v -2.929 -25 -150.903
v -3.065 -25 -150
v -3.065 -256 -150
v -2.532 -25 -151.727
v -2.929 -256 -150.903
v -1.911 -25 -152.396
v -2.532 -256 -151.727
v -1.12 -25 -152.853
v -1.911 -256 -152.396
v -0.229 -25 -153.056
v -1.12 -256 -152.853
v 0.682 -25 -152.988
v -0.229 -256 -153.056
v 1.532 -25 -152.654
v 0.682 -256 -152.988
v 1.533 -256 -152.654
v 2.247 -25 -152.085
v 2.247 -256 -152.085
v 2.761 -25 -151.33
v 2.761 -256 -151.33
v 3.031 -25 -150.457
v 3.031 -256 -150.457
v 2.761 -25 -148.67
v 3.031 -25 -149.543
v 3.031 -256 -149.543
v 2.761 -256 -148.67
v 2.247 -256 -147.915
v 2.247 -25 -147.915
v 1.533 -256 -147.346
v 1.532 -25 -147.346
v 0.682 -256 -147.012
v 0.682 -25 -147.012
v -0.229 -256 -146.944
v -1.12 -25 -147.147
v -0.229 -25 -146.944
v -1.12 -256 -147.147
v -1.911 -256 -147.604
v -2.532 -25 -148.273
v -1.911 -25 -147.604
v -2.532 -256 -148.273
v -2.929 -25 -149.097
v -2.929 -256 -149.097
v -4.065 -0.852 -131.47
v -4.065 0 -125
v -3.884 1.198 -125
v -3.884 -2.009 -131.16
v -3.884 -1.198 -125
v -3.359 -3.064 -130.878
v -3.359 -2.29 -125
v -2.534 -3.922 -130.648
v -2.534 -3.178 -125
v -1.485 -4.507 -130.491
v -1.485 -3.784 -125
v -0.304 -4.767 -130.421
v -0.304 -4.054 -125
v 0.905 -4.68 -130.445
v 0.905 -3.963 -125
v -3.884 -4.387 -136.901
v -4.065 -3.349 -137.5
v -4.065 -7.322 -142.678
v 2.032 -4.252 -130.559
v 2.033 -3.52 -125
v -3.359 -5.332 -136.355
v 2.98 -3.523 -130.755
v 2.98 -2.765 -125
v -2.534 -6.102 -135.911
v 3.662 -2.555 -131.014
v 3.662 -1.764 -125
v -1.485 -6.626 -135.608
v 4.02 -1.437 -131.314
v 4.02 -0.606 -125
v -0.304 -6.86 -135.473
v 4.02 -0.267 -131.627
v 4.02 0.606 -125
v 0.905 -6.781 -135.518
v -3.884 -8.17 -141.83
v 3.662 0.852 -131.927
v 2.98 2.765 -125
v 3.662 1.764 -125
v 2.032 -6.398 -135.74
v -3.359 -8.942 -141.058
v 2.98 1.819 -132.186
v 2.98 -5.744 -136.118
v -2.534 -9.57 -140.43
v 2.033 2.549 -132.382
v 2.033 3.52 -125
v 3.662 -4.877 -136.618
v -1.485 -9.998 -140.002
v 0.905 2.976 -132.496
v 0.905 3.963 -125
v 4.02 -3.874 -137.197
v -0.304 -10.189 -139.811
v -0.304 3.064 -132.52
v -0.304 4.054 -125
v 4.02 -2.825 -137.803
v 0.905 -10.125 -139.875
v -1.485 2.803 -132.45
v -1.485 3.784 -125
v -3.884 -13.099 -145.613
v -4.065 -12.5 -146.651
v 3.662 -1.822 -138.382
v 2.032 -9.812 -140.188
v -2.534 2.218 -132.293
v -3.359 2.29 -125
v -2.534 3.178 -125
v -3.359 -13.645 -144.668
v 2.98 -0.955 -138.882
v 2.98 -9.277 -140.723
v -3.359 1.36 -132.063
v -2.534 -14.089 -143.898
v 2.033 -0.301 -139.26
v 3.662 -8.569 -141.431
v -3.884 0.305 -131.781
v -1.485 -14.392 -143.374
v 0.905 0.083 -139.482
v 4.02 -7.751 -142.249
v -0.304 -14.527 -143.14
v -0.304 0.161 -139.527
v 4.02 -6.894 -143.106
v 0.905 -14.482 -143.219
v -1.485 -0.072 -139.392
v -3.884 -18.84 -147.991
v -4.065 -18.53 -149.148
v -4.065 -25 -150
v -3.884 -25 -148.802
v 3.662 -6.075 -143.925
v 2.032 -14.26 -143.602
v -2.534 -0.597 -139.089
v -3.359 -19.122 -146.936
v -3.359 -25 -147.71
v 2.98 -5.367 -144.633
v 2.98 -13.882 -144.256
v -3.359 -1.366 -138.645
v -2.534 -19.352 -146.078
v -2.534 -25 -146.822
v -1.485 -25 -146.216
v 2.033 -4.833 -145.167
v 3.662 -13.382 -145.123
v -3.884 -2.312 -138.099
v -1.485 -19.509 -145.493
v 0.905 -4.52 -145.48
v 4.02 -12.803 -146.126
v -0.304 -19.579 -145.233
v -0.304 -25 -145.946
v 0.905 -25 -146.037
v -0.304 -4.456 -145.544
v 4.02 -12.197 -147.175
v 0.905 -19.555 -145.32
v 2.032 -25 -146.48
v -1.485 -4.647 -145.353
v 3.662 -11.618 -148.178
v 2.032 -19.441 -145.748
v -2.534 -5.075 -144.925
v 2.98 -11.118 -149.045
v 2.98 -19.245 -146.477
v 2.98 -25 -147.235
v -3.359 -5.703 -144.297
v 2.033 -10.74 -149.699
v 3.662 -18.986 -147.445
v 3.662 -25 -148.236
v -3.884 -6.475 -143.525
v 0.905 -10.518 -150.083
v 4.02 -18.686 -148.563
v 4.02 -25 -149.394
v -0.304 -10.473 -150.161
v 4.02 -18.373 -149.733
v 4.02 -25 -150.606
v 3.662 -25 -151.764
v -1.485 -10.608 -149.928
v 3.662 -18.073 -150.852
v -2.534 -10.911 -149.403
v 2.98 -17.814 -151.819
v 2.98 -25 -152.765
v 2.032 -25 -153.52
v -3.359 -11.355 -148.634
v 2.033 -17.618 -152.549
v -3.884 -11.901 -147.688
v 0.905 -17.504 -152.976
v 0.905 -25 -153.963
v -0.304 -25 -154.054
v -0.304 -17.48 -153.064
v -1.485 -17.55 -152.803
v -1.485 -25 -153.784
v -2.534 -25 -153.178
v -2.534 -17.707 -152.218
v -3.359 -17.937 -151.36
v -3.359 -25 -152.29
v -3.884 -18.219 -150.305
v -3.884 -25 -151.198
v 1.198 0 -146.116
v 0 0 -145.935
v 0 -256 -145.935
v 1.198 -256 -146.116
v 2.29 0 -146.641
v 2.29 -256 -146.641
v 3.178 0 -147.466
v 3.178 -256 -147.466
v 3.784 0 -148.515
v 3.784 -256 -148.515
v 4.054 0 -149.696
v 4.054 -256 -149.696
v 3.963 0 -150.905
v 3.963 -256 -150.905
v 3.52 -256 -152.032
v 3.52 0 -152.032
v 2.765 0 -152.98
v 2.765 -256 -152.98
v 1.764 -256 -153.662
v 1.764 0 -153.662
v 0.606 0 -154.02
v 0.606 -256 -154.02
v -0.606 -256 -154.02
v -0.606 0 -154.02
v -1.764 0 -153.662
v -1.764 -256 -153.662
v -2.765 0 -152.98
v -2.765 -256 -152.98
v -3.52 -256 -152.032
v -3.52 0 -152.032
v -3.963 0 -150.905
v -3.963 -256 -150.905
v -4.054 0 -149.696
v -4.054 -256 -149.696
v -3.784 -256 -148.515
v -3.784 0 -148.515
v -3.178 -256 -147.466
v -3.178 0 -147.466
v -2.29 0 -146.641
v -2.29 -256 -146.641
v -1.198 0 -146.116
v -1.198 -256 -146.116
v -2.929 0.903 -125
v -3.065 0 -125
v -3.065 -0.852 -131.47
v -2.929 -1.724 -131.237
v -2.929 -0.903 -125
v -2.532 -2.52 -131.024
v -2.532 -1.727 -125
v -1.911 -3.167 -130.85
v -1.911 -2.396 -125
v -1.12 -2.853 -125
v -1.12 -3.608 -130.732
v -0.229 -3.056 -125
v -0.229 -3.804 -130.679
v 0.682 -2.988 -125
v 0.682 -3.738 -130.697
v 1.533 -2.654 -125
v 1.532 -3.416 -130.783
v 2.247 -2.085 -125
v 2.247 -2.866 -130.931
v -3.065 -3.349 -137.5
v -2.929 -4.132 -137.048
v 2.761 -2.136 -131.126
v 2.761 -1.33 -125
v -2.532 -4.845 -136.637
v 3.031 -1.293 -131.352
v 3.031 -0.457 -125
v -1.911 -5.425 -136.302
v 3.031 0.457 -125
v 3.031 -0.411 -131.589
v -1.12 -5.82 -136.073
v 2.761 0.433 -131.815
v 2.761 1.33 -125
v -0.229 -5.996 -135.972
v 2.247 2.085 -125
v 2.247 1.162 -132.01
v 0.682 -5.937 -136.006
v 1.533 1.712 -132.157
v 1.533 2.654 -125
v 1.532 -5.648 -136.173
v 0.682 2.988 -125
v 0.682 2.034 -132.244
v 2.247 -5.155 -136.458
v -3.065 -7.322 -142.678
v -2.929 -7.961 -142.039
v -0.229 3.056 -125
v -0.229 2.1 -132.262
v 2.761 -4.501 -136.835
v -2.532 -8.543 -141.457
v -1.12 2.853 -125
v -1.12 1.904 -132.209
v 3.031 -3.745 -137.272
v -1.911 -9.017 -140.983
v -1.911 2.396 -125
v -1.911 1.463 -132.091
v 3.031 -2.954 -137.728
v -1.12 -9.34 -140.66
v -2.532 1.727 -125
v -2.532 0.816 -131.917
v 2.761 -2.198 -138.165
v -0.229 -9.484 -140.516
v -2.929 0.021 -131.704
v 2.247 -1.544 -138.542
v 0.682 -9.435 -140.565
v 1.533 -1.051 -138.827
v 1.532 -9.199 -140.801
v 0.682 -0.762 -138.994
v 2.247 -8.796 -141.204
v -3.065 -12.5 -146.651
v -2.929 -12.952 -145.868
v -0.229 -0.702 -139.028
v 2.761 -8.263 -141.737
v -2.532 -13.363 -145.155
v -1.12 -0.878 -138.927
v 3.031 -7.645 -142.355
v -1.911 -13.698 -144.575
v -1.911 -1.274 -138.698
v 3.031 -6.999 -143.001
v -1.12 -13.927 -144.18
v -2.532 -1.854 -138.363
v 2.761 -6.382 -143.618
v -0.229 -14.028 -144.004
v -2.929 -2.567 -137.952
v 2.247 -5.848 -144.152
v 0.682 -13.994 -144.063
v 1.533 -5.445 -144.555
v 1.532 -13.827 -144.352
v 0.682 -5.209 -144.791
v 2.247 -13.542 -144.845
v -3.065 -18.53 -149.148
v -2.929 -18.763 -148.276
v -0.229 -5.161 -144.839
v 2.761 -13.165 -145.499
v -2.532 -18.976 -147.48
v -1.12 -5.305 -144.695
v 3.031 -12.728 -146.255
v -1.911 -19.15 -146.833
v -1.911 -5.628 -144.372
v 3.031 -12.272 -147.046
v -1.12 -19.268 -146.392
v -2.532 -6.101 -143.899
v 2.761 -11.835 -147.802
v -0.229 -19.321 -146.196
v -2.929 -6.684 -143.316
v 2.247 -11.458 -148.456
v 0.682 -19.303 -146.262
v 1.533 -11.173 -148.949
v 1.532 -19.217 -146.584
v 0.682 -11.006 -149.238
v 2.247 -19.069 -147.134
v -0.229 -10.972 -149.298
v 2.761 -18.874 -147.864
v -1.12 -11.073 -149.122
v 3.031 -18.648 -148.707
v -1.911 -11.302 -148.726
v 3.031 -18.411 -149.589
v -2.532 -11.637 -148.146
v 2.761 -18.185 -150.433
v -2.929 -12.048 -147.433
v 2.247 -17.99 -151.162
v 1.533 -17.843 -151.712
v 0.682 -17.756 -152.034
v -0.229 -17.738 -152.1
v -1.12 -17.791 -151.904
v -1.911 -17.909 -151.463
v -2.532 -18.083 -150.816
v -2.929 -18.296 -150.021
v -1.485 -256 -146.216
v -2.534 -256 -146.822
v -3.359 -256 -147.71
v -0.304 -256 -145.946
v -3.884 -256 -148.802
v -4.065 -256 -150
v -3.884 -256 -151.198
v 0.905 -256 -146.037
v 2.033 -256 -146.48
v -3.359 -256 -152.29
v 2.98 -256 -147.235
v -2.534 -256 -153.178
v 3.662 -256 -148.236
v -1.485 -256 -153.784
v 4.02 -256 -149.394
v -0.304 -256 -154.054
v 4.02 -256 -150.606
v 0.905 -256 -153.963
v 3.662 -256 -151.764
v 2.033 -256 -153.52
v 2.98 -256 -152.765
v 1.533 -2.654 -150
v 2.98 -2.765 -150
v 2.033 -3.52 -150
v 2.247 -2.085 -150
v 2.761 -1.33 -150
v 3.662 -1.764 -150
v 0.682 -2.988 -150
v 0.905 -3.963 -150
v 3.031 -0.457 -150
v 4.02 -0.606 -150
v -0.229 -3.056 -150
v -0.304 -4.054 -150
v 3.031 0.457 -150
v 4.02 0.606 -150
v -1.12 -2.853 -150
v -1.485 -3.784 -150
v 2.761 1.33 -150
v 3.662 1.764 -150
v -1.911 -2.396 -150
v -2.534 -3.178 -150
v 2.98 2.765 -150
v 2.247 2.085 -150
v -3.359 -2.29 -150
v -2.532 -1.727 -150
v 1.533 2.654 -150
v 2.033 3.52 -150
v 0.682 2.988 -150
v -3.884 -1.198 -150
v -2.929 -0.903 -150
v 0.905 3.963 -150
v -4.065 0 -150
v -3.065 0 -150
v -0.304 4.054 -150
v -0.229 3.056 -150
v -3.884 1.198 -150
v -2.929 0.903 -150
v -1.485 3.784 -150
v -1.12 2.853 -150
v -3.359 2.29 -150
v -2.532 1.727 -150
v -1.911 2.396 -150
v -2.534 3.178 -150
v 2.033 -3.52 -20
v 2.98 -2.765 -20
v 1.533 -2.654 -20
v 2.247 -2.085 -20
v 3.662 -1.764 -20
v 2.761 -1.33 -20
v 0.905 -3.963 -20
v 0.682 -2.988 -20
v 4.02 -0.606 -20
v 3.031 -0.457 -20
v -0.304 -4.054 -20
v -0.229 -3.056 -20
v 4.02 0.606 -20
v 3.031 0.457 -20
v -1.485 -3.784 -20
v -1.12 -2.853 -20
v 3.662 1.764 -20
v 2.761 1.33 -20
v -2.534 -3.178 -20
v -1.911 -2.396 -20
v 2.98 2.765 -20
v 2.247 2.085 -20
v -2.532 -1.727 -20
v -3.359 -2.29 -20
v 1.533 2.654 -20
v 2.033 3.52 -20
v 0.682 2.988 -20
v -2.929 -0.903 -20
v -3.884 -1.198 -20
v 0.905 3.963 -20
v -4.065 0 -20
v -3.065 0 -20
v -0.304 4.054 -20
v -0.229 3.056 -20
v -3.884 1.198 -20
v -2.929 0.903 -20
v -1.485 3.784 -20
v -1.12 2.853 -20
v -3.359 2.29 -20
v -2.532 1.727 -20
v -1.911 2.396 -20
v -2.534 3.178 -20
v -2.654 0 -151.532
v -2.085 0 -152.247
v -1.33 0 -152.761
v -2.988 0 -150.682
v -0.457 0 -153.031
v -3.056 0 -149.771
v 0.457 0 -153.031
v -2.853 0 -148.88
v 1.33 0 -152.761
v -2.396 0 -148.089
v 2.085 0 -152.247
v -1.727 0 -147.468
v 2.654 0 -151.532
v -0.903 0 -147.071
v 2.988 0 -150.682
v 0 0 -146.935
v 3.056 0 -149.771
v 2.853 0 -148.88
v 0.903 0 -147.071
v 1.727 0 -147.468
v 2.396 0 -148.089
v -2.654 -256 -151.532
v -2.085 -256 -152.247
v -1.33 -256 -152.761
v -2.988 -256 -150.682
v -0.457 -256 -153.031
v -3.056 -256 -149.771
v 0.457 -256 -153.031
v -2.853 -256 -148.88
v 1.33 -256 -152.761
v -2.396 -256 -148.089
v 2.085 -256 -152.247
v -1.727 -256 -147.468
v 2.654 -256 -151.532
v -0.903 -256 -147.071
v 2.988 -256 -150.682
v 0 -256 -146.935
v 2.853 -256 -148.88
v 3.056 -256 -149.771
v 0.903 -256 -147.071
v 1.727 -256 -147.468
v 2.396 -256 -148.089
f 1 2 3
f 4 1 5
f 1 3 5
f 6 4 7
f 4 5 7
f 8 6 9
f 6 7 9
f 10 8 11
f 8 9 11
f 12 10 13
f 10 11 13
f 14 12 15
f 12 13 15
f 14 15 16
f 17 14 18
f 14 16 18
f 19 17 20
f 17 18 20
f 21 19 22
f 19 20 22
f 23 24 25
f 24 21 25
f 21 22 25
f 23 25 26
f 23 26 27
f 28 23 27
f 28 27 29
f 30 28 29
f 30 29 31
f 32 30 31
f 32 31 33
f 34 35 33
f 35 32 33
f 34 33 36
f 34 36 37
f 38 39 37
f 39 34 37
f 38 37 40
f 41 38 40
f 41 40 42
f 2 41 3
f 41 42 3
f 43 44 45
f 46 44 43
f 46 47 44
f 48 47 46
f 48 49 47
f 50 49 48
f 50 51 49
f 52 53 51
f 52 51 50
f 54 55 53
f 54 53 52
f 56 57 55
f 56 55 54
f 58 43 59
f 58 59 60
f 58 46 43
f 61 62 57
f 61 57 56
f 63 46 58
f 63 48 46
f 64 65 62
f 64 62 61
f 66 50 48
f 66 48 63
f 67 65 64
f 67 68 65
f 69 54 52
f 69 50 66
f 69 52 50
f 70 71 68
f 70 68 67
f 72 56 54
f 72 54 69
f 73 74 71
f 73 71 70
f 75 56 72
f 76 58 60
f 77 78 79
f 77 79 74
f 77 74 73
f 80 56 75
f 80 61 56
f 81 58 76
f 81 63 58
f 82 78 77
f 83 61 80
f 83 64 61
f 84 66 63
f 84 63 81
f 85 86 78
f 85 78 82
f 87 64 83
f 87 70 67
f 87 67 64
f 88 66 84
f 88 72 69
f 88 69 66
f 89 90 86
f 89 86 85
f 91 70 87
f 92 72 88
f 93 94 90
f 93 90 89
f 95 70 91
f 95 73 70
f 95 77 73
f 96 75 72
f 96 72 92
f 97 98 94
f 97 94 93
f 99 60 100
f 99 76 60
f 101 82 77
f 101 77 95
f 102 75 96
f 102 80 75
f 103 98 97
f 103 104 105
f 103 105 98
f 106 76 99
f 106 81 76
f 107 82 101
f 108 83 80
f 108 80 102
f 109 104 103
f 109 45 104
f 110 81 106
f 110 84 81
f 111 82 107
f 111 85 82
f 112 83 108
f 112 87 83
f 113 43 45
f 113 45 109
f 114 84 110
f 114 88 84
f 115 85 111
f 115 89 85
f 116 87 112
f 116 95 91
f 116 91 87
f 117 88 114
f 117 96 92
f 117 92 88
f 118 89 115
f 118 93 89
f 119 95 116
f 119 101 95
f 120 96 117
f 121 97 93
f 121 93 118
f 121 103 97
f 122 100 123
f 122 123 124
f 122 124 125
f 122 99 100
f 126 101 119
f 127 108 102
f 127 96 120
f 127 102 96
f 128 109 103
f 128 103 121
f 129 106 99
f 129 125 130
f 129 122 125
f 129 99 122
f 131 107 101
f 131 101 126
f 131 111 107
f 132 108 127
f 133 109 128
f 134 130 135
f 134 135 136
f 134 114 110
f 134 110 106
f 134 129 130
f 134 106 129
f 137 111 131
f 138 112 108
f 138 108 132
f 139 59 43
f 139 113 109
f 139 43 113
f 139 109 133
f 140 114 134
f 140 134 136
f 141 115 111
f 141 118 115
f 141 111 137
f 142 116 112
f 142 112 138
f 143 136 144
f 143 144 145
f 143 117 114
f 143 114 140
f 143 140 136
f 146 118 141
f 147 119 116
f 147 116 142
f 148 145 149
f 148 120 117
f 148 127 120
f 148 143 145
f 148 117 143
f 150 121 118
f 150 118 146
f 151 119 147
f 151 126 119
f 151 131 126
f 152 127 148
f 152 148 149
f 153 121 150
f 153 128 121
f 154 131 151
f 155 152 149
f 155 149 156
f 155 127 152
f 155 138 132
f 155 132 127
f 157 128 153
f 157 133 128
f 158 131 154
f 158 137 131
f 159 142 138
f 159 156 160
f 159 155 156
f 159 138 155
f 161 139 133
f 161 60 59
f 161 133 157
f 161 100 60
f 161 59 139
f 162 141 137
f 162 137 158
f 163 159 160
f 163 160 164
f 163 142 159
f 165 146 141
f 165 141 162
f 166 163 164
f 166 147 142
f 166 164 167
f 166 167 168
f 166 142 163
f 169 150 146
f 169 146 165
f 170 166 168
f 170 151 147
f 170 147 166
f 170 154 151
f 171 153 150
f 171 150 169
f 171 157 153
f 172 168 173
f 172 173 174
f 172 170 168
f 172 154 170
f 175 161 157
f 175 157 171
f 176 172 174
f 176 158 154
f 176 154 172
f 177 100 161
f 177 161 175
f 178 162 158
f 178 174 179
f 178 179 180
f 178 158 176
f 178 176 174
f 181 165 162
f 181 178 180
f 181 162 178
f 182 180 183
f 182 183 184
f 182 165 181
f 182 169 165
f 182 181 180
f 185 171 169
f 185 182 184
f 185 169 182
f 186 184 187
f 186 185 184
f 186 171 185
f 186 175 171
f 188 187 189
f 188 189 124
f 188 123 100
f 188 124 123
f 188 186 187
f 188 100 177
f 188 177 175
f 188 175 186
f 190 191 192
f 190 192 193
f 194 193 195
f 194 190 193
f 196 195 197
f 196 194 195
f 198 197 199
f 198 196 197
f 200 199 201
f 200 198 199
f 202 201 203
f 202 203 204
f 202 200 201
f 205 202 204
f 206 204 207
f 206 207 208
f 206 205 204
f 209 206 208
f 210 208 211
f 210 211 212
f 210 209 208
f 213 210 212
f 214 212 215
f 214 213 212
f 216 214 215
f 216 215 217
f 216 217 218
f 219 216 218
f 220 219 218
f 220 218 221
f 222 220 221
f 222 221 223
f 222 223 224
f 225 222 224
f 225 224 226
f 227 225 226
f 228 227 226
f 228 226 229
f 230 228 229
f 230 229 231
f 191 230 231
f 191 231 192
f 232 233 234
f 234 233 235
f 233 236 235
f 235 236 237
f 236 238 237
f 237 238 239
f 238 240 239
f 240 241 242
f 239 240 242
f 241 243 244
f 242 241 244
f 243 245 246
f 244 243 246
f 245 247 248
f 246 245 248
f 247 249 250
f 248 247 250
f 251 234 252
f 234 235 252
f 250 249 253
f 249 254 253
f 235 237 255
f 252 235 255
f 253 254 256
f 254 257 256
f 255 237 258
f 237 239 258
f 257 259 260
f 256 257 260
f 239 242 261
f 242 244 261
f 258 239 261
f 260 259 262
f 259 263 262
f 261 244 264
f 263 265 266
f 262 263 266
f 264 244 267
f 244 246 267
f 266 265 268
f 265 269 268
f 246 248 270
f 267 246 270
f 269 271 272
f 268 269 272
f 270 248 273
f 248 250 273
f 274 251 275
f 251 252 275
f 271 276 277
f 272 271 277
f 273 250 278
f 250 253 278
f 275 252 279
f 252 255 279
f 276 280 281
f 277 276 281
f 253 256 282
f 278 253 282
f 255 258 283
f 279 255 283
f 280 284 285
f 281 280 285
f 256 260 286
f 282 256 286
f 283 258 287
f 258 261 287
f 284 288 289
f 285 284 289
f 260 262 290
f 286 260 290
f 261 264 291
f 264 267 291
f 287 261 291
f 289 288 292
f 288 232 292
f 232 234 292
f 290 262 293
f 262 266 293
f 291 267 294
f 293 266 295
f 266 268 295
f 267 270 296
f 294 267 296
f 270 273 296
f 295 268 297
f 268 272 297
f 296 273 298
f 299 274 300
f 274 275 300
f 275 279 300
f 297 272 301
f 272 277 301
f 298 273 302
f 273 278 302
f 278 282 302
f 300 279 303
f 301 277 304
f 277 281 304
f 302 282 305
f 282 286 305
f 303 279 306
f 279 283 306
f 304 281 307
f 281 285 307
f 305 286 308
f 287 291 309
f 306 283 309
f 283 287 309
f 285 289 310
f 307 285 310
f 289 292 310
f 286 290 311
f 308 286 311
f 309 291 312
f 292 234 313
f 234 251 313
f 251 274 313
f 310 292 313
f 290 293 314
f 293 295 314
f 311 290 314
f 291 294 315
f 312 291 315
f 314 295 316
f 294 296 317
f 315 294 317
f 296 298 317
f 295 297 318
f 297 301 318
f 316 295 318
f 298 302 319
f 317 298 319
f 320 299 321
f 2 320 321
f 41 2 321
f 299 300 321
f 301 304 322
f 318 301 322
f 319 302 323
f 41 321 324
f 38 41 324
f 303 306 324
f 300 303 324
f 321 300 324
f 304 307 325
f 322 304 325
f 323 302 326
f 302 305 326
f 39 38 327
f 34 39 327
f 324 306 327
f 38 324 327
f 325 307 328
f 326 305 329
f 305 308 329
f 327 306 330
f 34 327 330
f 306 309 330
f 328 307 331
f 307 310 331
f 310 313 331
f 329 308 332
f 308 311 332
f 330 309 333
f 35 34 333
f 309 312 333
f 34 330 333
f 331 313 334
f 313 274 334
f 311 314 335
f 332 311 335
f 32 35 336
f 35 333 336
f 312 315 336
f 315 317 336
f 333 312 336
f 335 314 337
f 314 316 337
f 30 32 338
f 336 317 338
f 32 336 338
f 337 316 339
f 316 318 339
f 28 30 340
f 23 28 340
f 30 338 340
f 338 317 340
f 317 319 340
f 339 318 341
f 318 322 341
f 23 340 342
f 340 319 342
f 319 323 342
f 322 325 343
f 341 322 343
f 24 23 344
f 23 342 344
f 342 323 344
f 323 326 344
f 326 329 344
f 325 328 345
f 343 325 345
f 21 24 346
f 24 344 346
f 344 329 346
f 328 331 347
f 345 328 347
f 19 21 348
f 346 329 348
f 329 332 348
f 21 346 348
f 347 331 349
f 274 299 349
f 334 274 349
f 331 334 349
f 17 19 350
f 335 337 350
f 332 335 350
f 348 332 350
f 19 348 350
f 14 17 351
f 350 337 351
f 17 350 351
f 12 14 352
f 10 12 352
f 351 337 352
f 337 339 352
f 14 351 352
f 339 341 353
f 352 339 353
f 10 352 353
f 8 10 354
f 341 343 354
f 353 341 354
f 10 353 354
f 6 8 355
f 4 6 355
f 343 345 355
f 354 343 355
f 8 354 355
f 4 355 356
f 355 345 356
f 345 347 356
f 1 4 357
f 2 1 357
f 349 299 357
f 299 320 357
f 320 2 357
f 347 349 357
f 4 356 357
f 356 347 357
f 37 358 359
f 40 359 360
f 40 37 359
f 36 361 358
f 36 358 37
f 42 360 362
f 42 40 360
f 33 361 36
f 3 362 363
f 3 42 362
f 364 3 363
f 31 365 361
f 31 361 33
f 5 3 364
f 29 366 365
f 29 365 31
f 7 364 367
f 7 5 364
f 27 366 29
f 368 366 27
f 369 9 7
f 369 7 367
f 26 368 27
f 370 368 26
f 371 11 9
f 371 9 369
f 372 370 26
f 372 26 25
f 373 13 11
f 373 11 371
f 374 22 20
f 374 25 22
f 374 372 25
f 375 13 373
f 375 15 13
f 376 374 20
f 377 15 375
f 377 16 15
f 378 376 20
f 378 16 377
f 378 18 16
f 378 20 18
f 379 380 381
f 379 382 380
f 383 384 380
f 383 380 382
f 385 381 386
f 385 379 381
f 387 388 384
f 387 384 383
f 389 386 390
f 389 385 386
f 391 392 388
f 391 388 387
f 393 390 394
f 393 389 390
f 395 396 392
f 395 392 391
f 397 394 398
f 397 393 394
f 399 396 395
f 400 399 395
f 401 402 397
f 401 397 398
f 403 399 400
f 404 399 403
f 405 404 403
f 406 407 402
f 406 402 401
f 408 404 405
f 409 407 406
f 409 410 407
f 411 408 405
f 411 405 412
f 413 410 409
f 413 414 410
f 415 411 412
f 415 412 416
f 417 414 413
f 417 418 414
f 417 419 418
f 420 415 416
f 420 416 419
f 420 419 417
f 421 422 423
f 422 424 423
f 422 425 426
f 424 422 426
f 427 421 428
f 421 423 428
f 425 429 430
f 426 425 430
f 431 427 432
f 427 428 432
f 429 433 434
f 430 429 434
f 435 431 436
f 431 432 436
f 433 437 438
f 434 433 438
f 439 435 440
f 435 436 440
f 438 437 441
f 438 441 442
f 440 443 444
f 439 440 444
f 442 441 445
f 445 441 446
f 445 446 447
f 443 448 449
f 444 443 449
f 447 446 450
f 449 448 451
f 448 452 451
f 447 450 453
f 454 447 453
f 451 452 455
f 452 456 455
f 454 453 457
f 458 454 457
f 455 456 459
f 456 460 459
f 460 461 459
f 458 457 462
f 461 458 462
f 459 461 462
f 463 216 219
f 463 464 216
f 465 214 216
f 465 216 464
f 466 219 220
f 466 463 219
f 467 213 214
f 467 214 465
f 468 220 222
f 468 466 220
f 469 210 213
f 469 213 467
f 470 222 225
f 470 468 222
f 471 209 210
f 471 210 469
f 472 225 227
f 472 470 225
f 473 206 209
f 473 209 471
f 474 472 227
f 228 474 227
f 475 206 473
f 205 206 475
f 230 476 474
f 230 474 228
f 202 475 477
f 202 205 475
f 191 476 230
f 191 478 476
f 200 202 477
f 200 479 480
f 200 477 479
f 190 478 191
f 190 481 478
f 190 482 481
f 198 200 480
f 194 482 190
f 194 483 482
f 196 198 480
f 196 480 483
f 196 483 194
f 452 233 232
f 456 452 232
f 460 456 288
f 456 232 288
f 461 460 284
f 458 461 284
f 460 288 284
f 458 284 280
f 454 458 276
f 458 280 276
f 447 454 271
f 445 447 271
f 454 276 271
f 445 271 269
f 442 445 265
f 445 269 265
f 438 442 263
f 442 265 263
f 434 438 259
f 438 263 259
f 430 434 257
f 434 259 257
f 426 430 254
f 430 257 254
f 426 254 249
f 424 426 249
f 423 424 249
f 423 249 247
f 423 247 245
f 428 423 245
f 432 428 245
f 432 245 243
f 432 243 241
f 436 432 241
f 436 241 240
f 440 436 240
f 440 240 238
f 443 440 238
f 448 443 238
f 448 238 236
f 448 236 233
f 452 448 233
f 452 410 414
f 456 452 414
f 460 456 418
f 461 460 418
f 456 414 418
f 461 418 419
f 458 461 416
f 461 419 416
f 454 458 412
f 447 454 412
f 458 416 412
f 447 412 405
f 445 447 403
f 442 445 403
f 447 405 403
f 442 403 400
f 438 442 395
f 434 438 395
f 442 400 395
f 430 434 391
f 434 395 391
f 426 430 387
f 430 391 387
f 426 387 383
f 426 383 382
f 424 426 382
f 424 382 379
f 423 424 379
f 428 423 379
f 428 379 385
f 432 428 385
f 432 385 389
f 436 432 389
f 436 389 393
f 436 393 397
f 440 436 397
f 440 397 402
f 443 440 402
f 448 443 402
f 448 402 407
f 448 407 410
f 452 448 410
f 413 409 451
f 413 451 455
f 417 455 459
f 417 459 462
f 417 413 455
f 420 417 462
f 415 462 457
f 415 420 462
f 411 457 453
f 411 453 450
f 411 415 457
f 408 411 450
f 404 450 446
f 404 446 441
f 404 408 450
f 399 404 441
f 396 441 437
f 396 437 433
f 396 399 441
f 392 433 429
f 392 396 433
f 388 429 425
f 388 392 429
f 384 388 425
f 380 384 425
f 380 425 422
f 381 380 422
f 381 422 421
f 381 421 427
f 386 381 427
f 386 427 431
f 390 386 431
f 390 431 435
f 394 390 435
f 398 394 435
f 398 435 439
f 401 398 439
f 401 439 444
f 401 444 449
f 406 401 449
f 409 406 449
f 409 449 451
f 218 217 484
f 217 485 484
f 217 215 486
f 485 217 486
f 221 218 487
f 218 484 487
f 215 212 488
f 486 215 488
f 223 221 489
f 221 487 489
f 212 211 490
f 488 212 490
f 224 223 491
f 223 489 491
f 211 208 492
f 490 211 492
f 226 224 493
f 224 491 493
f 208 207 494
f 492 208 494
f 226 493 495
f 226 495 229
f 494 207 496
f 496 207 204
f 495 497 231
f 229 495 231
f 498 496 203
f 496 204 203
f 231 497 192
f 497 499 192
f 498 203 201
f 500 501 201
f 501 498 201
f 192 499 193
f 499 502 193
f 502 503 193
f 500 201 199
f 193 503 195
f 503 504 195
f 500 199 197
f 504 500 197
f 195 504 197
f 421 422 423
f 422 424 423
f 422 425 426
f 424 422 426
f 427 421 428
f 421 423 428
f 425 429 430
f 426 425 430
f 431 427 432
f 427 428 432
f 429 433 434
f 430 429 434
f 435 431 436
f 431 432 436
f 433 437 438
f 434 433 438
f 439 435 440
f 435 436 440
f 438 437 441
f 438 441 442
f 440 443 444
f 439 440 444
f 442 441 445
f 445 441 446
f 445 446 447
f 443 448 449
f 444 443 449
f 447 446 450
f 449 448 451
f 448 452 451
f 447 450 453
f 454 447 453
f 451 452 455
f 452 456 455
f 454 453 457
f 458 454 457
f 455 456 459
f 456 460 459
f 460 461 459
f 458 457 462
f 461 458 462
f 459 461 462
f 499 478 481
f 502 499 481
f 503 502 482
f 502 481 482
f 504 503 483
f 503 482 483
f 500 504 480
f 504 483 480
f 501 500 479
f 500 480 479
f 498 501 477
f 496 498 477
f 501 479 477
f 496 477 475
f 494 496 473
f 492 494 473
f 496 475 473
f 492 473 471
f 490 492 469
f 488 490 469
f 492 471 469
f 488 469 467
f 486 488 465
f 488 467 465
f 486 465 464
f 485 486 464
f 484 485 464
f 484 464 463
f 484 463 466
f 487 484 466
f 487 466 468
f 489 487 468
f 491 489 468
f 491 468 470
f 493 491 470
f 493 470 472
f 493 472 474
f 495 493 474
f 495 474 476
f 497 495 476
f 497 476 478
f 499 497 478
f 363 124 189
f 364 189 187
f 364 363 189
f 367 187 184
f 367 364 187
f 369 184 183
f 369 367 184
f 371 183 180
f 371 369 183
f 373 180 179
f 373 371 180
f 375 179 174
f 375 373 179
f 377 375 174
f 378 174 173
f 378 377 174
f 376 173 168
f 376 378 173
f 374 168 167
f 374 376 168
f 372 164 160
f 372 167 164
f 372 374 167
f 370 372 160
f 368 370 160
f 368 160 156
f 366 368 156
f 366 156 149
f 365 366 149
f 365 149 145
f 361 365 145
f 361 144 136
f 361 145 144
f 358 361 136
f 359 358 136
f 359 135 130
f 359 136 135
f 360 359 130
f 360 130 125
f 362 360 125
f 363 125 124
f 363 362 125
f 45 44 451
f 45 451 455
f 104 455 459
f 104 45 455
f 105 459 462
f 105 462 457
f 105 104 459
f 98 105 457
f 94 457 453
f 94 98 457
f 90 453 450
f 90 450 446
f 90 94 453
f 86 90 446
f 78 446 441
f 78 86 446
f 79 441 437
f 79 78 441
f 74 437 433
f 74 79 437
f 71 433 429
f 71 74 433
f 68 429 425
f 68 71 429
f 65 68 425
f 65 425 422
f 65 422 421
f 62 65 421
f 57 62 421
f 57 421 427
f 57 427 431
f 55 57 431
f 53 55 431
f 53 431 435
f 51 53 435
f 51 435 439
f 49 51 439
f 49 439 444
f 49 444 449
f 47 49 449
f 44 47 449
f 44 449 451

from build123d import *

# Parameters (mm, degrees)
SWEEP_THIN1_PROFILE_R   = 4.065
SWEEP_THIN1_PROFILE_R_2 = 3.065
SWEEP_THIN2_PROFILE_R   = 4.065
SWEEP_THIN2_PROFILE_R_2 = 3.065
SWEEP_THIN3_PROFILE_R   = 4.065
SWEEP_THIN3_PROFILE_R_2 = 3.065


with BuildPart() as part:
    # Sweep-Thin1: sweep along a path in Sketch1
    with BuildLine(Plane(origin=(0, 0, 0), x_dir=(0, 0, -1), z_dir=(1, 0, 0))) as sweep_thin1_path:
        Line((20, 0), (125, 0))
        ThreePointArc((125, 0), (142.67766953, -7.32233047), (150, -25))
        Line((150, -25), (150, -256))
    # Sweep-Thin1 profile (on start of the path) → Sweep-Thin1 (sweep)
    with BuildSketch(Plane(origin=(0, 0, -20), x_dir=(-1, 0, 0), z_dir=(0, 0, -1))):
        Circle(SWEEP_THIN1_PROFILE_R)
        Circle(SWEEP_THIN1_PROFILE_R_2, mode=Mode.SUBTRACT)
    sweep(path=sweep_thin1_path.line)


with BuildPart() as body_2:
    # Sweep-Thin2: sweep along a path in Sketch12
    with BuildLine(Plane(origin=(0, 0, 0), x_dir=(0, 0, -1), z_dir=(1, 0, 0))) as sweep_thin2_path:
        Line((20, 0), (150, 0))
    # Sweep-Thin2 profile (on start of the path) → Sweep-Thin2 (sweep)
    with BuildSketch(Plane(origin=(0, 0, -20), x_dir=(-1, 0, 0), z_dir=(0, 0, -1))):
        Circle(SWEEP_THIN2_PROFILE_R)
        Circle(SWEEP_THIN2_PROFILE_R_2, mode=Mode.SUBTRACT)
    sweep(path=sweep_thin2_path.line)


with BuildPart() as body_3:
    # Sweep-Thin3: sweep along a path in Sketch23
    with BuildLine(Plane(origin=(0, 0, 0), x_dir=(0, 0, -1), z_dir=(1, 0, 0))) as sweep_thin3_path:
        Line((150, -256), (150, 0))
    # Sweep-Thin3 profile (on start of the path) → Sweep-Thin3 (sweep)
    with BuildSketch(Plane(origin=(0, -256, -150), x_dir=(0, 0, 1), z_dir=(0, 1, 0))):
        Circle(SWEEP_THIN3_PROFILE_R)
        Circle(SWEEP_THIN3_PROFILE_R_2, mode=Mode.SUBTRACT)
    sweep(path=sweep_thin3_path.line)


solid = Compound([part.part, body_2.part, body_3.part])
